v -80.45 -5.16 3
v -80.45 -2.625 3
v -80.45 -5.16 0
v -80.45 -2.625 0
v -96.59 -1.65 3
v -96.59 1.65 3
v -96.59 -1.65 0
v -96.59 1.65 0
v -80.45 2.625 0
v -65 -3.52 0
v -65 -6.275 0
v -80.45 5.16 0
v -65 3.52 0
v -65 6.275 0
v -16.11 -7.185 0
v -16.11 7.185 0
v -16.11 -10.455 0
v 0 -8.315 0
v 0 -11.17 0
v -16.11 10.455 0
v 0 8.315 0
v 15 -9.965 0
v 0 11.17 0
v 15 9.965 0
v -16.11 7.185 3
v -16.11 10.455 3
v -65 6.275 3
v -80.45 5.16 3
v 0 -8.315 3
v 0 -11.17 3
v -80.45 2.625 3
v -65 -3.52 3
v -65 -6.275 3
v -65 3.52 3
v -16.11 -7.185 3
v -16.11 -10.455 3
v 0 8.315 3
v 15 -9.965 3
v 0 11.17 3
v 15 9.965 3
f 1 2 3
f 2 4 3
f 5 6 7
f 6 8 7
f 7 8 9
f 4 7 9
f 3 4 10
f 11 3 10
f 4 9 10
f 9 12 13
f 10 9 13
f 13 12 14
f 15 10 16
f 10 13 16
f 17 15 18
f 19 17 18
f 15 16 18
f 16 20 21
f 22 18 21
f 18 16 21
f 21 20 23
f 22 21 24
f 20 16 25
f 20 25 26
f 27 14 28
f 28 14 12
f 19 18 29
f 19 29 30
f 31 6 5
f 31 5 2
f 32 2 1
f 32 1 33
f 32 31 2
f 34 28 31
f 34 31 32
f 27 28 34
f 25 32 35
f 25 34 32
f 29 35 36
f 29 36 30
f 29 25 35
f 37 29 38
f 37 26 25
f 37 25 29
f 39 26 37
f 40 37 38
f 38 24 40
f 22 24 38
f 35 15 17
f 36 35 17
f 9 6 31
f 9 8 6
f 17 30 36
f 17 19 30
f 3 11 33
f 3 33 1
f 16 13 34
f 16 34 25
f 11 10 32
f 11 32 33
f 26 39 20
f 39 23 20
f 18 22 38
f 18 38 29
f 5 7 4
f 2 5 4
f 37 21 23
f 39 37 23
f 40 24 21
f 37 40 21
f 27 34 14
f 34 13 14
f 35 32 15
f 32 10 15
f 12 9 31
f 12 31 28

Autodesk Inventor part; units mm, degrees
ref_plane "YZ Plane" through (0, 0, 0) normal (1, 0, 0) x (0, 1, 0)
ref_plane "XZ Plane" through (0, 0, 0) normal (0, 1, 0) x (-1, 0, 0)
ref_plane "XY Plane" through (0, 0, 0) normal (0, 0, 1) x (1, 0, 0)
sketch "Sketch1" plane through (0, 0, 0) normal (0, 0, 1) x (1, 0, 0)
  line L0 (0, 0) -> (-65, 0)
  line L1 (-65, 0) -> (-65, 3.52)
  line L2 (0, 0) -> (0, 8.315)
  line L3 (0, 0) -> (0, 11.17)
  line L4 (0, 0) -> (15, 0)
  line L5 (15, 0) -> (15, 9.965)
  line L6 (15, 9.965) -> (0, 8.315)
  line L7 (0, 0) -> (-16.11, 0)
  line L8 (-16.11, 0) -> (-16.11, 7.185)
  line L9 (-16.11, 0) -> (-16.11, 10.455)
  line L10 (-65, 0) -> (-65, 6.275)
  line L11 (-65, 0) -> (-80.45, 0)
  line L12 (-80.45, 0) -> (-80.45, 2.625)
  line L13 (-80.45, 0) -> (-80.45, 5.16)
  line L14 (-80.45, 0) -> (-96.59, 0)
  line L15 (-96.59, 0) -> (-96.59, 1.65)
  line L16 (-65, 6.275) -> (-80.45, 5.16)
  line L17 (-96.59, 1.65) -> (-80.45, 2.625)
  line L18 (-65, 3.52) -> (-16.11, 7.185)
  line L19 (0, 11.17) -> (-16.11, 10.455)
  line L20 (-65, 0) -> (-65, -3.52)
  line L21 (0, 0) -> (0, -8.315)
  line L22 (0, 0) -> (0, -11.17)
  line L23 (15, 0) -> (15, -9.965)
  line L24 (15, -9.965) -> (0, -8.315)
  line L25 (-16.11, 0) -> (-16.11, -7.185)
  line L26 (-16.11, 0) -> (-16.11, -10.455)
  line L27 (-65, 0) -> (-65, -6.275)
  line L28 (-80.45, 0) -> (-80.45, -2.625)
  line L29 (-80.45, 0) -> (-80.45, -5.16)
  line L30 (-96.59, 0) -> (-96.59, -1.65)
  line L31 (-65, -6.275) -> (-80.45, -5.16)
  line L32 (-96.59, -1.65) -> (-80.45, -2.625)
  line L33 (-65, -3.52) -> (-16.11, -7.185)
  line L34 (0, -11.17) -> (-16.11, -10.455)
  point P0 (-16.11, -7.185)
  dimension "d0" = 65
  dimension "d1" = 3.52
  dimension "d2" = 8.315
  dimension "d3" = 11.17
  dimension "d4" = 15
  dimension "d6" = 9.965
  dimension "d7" = 16.11
  dimension "d8" = 7.185
  dimension "d9" = 10.455
  dimension "d10" = 6.275
  dimension "d11" = 15.45
  dimension "d12" = 2.625
  dimension "d13" = 5.16
  dimension "d14" = 16.14
  dimension "d15" = 1.65
extrude "Extrusion1" add sketch "Sketch1" along normal blind 3
